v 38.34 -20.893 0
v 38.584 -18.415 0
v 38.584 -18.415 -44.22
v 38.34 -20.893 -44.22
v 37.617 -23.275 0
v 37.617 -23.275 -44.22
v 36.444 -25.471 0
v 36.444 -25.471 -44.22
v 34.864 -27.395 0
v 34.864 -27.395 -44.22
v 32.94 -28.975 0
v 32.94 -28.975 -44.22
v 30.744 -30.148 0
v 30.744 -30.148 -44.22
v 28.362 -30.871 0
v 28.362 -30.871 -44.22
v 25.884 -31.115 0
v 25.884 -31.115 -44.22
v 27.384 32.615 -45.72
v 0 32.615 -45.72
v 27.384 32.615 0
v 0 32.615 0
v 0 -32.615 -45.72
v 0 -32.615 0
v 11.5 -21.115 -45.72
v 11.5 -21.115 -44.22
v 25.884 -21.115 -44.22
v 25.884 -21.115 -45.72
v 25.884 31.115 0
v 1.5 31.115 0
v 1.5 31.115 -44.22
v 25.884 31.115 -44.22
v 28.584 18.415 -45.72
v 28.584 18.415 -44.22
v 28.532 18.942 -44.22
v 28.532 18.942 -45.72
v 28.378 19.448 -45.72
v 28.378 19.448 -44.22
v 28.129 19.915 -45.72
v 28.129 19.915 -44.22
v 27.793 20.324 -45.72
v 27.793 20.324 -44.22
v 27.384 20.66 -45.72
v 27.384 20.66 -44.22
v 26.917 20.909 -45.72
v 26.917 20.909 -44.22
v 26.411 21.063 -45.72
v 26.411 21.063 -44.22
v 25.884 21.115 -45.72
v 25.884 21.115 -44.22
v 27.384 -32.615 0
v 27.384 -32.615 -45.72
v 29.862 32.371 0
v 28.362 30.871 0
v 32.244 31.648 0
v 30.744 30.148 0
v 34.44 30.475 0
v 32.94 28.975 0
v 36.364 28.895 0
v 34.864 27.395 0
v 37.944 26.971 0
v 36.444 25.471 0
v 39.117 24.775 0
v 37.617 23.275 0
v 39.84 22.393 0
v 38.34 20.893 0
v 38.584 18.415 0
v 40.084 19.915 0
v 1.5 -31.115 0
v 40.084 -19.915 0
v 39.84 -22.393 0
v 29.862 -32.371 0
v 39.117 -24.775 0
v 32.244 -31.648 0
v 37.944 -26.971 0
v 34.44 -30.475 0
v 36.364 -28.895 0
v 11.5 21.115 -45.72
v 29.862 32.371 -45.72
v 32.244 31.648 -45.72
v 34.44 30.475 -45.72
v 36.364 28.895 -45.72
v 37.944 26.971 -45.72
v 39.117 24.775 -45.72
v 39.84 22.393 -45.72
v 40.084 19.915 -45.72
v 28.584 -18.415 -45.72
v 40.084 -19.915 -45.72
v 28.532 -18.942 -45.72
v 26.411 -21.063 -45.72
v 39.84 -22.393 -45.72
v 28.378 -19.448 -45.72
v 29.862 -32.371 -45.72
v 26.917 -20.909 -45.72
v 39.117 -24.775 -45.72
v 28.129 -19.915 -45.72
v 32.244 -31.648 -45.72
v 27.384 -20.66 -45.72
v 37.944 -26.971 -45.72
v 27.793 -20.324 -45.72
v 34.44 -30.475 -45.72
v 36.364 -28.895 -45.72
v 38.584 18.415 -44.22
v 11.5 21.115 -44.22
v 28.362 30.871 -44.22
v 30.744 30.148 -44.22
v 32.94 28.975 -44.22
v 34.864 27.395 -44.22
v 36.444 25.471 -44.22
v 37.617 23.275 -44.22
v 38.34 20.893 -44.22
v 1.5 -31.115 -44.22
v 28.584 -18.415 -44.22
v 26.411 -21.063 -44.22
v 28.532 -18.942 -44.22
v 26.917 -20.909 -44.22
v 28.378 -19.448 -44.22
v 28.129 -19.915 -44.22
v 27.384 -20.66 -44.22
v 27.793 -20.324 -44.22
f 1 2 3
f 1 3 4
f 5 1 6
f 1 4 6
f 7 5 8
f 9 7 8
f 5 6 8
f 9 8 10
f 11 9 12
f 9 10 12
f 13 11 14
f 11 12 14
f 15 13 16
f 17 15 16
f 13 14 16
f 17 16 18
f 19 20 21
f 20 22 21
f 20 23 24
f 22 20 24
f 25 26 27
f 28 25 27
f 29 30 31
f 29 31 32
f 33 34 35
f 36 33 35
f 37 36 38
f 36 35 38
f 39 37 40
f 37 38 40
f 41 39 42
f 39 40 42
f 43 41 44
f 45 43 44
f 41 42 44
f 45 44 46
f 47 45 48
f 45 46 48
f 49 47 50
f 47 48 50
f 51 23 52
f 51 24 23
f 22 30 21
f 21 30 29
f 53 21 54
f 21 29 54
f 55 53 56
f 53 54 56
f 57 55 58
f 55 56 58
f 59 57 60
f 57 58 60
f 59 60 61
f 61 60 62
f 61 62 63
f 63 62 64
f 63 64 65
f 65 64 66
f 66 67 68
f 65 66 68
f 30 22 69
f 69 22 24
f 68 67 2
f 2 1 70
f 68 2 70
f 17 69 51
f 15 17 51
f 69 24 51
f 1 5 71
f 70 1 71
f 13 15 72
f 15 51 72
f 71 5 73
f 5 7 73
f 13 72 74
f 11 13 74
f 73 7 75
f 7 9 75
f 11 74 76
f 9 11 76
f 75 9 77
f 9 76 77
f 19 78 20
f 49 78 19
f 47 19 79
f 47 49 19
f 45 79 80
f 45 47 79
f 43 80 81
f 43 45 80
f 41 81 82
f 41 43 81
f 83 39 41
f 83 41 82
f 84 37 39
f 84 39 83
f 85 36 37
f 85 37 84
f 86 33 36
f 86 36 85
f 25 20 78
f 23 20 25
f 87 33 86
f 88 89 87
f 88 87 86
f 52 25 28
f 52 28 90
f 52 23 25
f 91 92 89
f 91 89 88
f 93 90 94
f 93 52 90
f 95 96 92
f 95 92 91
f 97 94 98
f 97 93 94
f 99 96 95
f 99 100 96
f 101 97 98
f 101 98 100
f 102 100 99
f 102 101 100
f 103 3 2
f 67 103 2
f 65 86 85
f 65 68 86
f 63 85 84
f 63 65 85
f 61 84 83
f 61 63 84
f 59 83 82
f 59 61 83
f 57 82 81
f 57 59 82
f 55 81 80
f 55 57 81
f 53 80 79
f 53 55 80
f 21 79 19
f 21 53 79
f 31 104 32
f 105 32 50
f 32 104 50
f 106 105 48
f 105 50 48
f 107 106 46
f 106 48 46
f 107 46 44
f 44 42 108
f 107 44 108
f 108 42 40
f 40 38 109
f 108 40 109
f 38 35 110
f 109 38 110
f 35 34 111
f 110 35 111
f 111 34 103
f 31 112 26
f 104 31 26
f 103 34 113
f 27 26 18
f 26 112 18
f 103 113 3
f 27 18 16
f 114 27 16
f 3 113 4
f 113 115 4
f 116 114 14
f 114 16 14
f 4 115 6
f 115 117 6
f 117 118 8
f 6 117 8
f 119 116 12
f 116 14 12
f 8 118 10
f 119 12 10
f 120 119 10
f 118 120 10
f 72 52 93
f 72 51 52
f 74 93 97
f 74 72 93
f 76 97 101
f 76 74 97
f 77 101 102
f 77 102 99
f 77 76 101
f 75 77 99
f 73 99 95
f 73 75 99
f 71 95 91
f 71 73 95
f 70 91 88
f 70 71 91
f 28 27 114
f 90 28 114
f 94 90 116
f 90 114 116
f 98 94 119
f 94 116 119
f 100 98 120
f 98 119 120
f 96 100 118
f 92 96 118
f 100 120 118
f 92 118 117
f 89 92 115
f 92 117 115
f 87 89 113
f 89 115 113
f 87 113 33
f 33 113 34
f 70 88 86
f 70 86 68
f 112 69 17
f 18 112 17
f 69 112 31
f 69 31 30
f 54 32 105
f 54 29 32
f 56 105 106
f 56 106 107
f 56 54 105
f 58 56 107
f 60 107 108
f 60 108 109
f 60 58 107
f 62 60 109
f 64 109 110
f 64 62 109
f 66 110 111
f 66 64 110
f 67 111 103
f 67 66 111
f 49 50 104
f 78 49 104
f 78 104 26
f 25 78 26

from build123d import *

# Parameters (mm, degrees)
F0_W     = 40.084
F0_H     = 45.72
F1_DEPTH = 32.615
F2_T     = -1.5
F3_R     = 12.7
F5_DEPTH = 25.4


with BuildPart() as f1:
    # F0 (on Front) → F1 (new body, symmetric)
    with BuildSketch(Plane.XZ):
        with Locations((20.042, -22.86)):
            Rectangle(F0_W, F0_H)
    extrude(amount=F1_DEPTH, both=True)

    # F2
    f2_openings = [f1.faces().sort_by_distance(p)[0] for p in [
        (20.042, 0, 0),
    ]]
    offset(amount=F2_T, openings=f2_openings)

    # F3
    f3_edges = [f1.edges().sort_by_distance(p)[0] for p in [
        (38.584, 31.115, -22.11),
        (38.584, -31.115, -22.11),
        (40.084, -32.615, -22.86),
        (40.084, 32.615, -22.86),
    ]]
    fillet(f3_edges, radius=F3_R)

    # F4 (on face) → F5 (cut)
    with BuildSketch(Plane.XY.offset(-44.22)):
        with BuildLine():
            Line((11.5, -21.115), (25.884, -21.115))
            ThreePointArc((25.884, -21.115), (27.7931883092, -20.3241883092), (28.584, -18.415))
            Line((28.584, -18.415), (28.584, 18.415))
            ThreePointArc((28.584, 18.415), (27.7931883092, 20.3241883092), (25.884, 21.115))
            Line((25.884, 21.115), (11.5, 21.115))
            Line((11.5, 21.115), (11.5, -21.115))
        make_face()
    extrude(amount=-F5_DEPTH, mode=Mode.SUBTRACT)


solid = f1.part
